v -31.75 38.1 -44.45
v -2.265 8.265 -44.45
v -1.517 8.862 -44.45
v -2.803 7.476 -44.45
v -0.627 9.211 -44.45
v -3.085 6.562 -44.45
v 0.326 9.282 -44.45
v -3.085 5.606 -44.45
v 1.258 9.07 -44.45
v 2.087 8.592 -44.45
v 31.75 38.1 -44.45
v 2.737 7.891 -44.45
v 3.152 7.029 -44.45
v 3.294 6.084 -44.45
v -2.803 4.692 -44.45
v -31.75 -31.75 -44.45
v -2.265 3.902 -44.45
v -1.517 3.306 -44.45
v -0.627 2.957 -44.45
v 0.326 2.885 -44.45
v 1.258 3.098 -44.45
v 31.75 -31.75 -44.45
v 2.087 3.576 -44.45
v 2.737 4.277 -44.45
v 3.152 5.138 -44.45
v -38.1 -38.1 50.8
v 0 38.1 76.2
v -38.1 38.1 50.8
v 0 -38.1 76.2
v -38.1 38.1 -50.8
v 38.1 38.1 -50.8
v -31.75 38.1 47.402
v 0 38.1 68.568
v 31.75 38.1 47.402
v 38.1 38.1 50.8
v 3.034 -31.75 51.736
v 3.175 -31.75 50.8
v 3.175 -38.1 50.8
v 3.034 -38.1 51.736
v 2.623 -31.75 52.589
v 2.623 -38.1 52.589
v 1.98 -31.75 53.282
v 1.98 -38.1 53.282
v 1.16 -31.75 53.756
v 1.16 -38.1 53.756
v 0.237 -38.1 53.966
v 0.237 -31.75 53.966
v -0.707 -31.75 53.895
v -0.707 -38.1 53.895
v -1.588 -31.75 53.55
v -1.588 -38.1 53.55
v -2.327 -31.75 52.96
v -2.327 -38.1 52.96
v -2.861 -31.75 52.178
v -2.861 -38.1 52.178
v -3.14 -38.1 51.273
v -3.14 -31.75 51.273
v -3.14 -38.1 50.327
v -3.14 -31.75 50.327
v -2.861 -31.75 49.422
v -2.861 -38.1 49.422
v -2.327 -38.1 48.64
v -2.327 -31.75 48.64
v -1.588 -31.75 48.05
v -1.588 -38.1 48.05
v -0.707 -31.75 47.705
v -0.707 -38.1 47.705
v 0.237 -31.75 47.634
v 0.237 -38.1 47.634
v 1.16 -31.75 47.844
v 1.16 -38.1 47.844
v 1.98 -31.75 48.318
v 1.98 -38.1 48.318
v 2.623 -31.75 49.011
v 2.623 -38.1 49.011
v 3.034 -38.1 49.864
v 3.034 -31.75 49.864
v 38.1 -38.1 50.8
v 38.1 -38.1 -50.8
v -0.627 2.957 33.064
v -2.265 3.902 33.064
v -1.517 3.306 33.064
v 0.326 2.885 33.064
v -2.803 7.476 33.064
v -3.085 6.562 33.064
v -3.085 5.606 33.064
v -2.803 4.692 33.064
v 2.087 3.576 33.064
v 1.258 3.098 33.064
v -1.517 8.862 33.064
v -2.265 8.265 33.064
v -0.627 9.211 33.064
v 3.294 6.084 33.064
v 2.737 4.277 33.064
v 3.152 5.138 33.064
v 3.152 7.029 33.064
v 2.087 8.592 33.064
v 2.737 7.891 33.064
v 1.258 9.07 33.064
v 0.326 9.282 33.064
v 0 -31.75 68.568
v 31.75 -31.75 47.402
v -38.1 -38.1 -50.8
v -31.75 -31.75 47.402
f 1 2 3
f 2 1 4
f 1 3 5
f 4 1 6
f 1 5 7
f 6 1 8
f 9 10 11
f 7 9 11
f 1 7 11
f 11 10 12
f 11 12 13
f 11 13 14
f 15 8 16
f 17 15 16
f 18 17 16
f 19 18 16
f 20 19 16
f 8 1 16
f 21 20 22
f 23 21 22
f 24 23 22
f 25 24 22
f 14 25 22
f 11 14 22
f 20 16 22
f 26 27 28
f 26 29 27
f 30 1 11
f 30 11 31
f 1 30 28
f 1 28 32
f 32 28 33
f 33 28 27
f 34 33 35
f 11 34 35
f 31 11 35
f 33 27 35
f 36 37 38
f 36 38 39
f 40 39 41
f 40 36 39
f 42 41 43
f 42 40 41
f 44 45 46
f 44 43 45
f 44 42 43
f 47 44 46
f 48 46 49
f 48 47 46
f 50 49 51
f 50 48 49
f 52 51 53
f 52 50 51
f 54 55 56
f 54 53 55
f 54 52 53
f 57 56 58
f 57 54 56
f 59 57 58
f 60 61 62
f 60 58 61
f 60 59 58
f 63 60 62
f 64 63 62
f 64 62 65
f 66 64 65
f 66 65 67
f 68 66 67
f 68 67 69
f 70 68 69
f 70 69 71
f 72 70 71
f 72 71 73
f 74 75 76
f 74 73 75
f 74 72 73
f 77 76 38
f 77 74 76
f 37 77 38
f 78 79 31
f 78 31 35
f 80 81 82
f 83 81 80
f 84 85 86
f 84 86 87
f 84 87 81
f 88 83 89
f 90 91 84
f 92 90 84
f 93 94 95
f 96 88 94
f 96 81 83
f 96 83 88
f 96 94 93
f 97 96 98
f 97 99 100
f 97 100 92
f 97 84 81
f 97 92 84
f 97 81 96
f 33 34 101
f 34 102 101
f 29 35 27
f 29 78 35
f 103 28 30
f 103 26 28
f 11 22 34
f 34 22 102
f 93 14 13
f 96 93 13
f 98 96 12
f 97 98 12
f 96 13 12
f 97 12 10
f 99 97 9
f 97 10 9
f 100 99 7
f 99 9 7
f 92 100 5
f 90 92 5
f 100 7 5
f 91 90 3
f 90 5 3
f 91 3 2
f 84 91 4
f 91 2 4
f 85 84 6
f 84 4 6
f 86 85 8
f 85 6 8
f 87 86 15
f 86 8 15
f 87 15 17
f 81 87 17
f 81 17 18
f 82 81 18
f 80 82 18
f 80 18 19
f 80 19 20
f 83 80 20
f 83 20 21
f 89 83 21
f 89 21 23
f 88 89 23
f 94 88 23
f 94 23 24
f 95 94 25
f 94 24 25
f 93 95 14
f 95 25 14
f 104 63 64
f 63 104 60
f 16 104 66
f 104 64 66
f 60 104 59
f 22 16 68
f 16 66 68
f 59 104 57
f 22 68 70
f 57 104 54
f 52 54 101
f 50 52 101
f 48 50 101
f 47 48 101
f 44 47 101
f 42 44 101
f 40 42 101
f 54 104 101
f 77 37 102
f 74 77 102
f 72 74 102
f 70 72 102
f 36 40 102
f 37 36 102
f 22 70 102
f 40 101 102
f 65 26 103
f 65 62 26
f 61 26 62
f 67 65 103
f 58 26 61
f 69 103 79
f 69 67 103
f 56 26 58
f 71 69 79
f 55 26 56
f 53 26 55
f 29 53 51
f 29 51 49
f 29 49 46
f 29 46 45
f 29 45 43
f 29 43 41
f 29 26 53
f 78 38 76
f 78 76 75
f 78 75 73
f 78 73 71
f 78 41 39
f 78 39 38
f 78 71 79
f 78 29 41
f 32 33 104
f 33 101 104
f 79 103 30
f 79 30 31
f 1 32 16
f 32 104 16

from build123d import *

# Parameters (mm, degrees)
F1_DEPTH = 38.1
F2_T     = -6.35
F5_R     = 3.2075388265
F6_DEPTH = 77.5145
F7_R     = 3.175
F8_DEPTH = 38.101


# Not quite as in the source:
# - a feature of the source that left no trace in its solid (it failed there, or was rolled back) is left out
# - the program builds the solid bodies; features that only make, move or delete a surface that nothing else refers to are left out


with BuildPart() as f1:
    # F0 (on Front) → F1 (new body, symmetric)
    with BuildSketch(Plane.XZ):
        Polygon((-38.1, 50.8), (-38.1, -50.8), (38.1, -50.8), (38.1, 50.8), (0, 76.2), align=None)
    extrude(amount=F1_DEPTH, both=True)

    # F2
    f2_openings = [f1.faces().sort_by_distance(p)[0] for p in [
        (0, 38.1, 6.585185),
    ]]
    offset(amount=F2_T, openings=f2_openings)

    # F5 (on face) → F6 (join)
    with BuildSketch(Plane.XY.offset(-44.45)):
        with Locations((0.0866505507, 6.0838097706)):
            Circle(F5_R)
    extrude(amount=F6_DEPTH)

    # F7 (on face) → F8 (cut, through all)
    with BuildSketch(Plane.XZ):
        with Locations((0, 50.8)):
            Circle(F7_R)
    extrude(amount=F8_DEPTH, mode=Mode.SUBTRACT)


solid = f1.part
